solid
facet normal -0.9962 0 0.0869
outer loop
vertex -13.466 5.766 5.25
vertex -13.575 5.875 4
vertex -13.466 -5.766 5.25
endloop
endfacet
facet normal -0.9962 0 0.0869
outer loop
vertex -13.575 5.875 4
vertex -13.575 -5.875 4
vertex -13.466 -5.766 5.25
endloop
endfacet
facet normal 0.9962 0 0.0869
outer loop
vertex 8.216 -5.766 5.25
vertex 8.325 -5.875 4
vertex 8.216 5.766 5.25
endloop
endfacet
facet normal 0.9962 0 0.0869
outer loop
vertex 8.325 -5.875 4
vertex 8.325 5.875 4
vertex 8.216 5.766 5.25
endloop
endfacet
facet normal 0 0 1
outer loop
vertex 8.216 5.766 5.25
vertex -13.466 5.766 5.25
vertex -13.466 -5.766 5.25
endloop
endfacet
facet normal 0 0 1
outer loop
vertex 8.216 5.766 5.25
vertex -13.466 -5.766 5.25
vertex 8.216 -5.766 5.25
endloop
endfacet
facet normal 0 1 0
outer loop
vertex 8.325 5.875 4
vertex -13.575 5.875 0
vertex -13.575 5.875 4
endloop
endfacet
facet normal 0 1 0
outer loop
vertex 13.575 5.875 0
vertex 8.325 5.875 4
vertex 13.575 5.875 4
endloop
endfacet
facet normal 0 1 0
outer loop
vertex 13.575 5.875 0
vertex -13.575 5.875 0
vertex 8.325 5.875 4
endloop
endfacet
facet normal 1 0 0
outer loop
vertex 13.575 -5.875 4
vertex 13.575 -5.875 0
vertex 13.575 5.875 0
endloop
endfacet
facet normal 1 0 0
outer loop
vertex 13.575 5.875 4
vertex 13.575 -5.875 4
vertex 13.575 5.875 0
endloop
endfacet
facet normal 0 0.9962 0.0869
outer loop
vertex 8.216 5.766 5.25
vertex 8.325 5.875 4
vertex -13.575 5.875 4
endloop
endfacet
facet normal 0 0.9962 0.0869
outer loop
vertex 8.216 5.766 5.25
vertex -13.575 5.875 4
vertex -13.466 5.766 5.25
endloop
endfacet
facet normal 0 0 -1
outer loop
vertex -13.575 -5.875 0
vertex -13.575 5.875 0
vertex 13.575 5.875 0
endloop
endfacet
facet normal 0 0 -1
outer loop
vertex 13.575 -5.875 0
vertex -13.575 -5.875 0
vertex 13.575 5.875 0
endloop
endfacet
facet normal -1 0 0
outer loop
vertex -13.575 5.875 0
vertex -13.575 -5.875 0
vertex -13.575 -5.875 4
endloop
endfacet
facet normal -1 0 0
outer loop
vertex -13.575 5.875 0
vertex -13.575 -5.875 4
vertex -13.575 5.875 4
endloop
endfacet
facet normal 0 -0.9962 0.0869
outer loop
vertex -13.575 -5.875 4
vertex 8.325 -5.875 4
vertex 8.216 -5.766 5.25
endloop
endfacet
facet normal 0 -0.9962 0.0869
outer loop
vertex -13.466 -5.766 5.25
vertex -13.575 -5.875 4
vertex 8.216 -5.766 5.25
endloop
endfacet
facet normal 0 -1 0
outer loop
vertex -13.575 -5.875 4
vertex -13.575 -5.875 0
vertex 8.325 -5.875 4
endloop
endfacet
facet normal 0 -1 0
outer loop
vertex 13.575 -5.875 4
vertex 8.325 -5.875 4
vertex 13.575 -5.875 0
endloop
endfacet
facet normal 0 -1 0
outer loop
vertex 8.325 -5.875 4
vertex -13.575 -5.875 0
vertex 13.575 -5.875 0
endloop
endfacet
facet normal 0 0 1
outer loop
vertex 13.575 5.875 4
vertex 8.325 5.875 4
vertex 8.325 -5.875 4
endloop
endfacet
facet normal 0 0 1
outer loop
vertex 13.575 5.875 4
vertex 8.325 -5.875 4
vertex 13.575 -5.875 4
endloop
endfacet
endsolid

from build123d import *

# Parameters (mm, degrees)
SKETCH1_W           = 27.15
SKETCH1_H           = 11.75
BOSS_EXTRUDE1_DEPTH = 4
SKETCH2_W           = 21.9
SKETCH2_H           = 11.75
BOSS_EXTRUDE2_DEPTH = 1.25
BOSS_EXTRUDE2_TAPER = 5


with BuildPart() as part:
    # Sketch1 → Boss-Extrude1 (new body)
    with BuildSketch(Plane.XY):
        Rectangle(SKETCH1_W, SKETCH1_H)
    extrude(amount=BOSS_EXTRUDE1_DEPTH)

    # Sketch2 → Boss-Extrude2 (add)
    with BuildSketch(Plane.XY.offset(4)):
        with Locations((-2.625, 0)):
            Rectangle(SKETCH2_W, SKETCH2_H)
    extrude(amount=BOSS_EXTRUDE2_DEPTH, taper=BOSS_EXTRUDE2_TAPER)


solid = part.part
